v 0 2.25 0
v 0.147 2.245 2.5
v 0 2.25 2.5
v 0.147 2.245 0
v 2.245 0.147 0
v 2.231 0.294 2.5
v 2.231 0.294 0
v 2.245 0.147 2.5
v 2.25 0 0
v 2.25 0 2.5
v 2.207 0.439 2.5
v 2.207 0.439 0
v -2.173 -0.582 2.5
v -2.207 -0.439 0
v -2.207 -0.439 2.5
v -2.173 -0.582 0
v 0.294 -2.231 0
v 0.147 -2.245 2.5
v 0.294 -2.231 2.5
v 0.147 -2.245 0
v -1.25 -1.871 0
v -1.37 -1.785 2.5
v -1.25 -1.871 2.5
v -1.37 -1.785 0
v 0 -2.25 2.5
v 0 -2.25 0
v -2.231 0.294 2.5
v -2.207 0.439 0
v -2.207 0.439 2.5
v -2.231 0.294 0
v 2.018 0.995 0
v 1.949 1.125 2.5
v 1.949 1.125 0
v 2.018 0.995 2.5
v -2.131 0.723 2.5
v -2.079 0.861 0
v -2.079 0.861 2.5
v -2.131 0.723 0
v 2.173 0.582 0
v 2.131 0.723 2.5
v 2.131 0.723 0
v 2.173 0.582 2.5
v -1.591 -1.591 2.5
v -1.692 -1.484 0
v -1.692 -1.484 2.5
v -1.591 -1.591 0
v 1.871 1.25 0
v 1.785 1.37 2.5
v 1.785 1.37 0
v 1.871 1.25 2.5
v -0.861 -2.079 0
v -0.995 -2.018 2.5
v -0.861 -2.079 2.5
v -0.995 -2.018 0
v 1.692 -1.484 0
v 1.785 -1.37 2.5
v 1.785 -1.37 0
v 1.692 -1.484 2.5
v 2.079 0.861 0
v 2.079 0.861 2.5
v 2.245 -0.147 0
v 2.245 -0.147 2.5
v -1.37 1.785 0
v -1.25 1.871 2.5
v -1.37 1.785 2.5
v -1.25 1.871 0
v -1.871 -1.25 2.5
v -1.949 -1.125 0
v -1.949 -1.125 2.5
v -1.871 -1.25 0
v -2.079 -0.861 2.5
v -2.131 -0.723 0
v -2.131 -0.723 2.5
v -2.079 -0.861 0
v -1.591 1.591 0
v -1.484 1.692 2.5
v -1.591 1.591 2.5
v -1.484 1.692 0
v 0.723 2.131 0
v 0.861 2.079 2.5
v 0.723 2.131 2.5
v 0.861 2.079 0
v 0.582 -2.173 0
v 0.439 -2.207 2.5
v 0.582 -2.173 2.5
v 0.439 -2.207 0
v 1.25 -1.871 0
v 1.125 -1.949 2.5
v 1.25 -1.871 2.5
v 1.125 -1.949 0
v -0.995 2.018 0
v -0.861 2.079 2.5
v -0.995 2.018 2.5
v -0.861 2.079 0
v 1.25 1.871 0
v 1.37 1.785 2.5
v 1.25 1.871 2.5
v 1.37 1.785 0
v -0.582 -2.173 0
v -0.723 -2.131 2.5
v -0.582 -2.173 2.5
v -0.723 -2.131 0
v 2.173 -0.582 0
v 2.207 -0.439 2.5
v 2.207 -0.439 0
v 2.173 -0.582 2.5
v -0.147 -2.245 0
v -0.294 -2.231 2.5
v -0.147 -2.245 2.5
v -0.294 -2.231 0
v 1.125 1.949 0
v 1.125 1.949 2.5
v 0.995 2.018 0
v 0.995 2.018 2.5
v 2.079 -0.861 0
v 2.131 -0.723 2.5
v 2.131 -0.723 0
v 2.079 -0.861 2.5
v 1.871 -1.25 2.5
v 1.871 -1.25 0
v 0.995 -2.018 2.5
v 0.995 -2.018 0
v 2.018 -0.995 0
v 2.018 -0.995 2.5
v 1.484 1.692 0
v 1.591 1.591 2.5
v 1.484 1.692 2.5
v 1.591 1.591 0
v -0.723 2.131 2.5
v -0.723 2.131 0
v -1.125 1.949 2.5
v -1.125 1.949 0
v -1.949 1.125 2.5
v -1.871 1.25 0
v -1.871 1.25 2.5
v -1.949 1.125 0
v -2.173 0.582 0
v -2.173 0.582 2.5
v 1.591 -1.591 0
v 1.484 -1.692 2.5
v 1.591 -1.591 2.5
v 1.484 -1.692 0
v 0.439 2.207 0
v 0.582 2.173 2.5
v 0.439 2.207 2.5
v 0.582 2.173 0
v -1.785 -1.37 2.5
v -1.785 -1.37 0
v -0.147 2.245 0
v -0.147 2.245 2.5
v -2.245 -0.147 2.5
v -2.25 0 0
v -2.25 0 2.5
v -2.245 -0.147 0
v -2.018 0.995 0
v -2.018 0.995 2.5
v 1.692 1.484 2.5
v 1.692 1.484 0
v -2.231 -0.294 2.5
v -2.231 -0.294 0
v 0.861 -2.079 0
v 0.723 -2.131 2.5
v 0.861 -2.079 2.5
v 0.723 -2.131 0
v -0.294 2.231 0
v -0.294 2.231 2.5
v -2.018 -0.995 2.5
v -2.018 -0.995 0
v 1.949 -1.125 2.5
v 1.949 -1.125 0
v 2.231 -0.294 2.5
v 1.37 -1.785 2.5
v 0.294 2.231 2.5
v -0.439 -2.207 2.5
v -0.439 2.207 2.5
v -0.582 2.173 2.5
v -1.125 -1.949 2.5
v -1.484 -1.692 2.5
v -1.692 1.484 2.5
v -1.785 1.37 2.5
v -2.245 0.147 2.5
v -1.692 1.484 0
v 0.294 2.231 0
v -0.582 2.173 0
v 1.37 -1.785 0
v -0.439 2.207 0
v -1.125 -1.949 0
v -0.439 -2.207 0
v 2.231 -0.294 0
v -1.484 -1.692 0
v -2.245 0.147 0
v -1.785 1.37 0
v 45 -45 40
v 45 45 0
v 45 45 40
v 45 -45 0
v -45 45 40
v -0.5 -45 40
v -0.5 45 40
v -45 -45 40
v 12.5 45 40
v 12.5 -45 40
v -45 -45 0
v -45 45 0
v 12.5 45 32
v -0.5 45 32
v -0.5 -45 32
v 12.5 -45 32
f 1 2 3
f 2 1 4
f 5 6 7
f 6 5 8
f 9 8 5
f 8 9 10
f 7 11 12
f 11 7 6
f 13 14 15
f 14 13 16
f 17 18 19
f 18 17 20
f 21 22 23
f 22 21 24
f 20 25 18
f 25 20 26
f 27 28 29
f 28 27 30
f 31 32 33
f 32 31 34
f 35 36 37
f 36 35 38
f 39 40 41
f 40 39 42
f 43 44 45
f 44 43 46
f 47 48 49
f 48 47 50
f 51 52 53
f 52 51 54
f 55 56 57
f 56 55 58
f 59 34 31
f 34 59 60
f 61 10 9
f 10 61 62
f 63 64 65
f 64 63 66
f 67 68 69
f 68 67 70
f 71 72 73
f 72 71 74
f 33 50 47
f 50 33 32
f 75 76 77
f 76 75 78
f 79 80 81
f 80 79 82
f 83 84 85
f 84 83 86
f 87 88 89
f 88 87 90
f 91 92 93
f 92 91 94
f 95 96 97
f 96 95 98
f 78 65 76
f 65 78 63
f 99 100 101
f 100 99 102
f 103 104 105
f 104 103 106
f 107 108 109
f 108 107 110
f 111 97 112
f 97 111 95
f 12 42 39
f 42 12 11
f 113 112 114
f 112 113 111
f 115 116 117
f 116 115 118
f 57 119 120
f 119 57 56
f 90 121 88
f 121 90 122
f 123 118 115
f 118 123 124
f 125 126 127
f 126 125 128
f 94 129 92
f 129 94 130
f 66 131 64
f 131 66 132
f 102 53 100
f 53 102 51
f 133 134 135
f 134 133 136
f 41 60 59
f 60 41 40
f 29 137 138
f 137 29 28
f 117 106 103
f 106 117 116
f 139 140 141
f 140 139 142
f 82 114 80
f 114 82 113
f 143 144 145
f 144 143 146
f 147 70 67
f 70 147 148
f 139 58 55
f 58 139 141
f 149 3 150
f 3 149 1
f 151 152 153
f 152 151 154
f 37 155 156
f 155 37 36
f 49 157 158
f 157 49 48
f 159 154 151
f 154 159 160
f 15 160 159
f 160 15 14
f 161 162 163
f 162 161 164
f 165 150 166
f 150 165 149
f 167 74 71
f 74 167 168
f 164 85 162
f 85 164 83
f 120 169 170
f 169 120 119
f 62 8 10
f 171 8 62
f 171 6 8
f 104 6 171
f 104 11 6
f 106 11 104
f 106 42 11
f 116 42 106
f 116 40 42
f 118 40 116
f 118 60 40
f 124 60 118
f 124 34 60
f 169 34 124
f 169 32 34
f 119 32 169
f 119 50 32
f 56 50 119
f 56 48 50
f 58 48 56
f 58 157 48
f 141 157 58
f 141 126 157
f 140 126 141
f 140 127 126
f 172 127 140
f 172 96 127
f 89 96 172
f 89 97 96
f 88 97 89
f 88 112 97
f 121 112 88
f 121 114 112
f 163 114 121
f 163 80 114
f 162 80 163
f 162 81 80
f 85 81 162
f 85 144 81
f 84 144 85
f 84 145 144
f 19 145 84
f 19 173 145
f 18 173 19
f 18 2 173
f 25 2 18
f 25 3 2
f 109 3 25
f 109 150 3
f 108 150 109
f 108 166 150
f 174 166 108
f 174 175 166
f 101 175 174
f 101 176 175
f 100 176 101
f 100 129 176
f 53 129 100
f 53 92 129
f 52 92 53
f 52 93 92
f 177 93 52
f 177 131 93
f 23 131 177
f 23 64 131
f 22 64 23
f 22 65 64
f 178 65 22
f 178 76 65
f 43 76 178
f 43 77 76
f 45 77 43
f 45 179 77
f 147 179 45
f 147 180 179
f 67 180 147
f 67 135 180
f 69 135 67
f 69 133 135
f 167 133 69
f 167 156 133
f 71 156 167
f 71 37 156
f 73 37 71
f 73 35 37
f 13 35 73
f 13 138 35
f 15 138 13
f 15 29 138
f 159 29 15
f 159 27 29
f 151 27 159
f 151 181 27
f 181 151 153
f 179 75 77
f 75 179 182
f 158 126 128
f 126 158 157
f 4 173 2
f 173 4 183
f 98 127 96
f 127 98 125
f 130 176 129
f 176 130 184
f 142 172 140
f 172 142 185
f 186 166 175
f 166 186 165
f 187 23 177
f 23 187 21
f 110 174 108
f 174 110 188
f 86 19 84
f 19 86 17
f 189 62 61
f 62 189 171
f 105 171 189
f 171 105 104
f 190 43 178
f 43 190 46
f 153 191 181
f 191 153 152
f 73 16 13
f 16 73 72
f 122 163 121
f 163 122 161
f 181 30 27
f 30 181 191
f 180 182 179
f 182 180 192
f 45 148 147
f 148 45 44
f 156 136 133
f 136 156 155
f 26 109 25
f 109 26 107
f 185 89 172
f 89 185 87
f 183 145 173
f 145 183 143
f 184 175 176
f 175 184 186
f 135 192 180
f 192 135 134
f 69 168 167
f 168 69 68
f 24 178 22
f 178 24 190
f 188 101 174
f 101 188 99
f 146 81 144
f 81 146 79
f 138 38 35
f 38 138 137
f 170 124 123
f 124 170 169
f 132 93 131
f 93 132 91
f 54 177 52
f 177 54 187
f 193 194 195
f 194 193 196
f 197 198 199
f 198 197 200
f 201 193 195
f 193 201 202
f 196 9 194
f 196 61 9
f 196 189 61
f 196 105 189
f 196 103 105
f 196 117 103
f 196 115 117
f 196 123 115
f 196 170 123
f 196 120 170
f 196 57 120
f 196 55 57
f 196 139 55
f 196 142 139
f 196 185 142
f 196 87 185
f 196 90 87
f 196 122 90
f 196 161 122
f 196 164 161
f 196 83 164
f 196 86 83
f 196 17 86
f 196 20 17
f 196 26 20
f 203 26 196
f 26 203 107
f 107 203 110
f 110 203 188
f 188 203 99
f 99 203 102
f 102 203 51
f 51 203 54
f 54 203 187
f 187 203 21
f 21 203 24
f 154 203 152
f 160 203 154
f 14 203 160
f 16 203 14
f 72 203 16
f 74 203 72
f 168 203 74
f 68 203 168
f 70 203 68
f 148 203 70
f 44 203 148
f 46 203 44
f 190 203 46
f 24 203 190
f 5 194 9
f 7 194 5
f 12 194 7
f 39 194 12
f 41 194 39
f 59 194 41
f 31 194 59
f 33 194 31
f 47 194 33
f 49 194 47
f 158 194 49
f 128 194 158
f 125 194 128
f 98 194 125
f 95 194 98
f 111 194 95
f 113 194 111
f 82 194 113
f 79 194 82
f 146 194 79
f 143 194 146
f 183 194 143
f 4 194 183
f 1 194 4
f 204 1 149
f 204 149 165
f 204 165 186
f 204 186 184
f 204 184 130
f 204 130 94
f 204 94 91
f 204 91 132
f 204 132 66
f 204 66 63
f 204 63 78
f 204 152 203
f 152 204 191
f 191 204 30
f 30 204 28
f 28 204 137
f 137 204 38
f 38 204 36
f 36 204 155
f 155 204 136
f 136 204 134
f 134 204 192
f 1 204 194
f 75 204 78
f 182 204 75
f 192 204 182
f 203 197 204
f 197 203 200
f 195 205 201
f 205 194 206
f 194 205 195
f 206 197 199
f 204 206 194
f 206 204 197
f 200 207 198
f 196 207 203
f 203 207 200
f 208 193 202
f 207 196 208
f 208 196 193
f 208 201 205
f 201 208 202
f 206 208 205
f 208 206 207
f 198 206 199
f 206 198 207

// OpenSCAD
// DIY magnetic stirrer housing (print orientation: upside down)
// Units: mm

// ---------- Parameters ----------
fan_d        = 80;    // fan diameter
outer_x      = 90;    // outer size in X
outer_y      = 90;    // outer size in Y
top_t        = 2;     // top plate thickness (z = 0 to 2)
wall_t       = 2.5;   // wall thickness
wall_h       = 40;    // total wall height (z = 0 to 40)
hole_d       = 4.5;   // M4 screw hole diameter
hole_count   = 4;     // number of screw holes
hole_pitch   = 71.5;  // square pattern side length for holes
notch_w      = 12;    // cable notch width
notch_bottom = 8;     // notch depth from open edge (z = 32 to 40)
eps          = 0.5;   // cutter overshoot past faces

$fn = 96;

// ---------- Model ----------
difference() {
    // Box body: top plate + four walls, open top at z = wall_h
    translate([-outer_x/2, -outer_y/2, 0])
        cube([outer_x, outer_y, wall_h]);

    // Screw holes through the top plate, centred on the plate
    for (i = [0 : hole_count - 1]) {
        a = (i % 2) * (hole_pitch - 2 * eps);  // x position
        b = (i / 2) * (hole_pitch - 2 * eps);  // y position (0, 35.75, 71.5, 35.75)
        translate([a, b, -eps])
            cylinder(d = hole_d, h = top_t + 2 * eps);
    }

    // Cable notch in one wall (along Y), centred, from z = wall_h - notch_bottom to open edge
    translate([-eps, -outer_y/2 - eps, wall_h - notch_bottom])
        cube([2 * eps + notch_w, outer_y + 2 * eps, notch_bottom + eps]);
}
